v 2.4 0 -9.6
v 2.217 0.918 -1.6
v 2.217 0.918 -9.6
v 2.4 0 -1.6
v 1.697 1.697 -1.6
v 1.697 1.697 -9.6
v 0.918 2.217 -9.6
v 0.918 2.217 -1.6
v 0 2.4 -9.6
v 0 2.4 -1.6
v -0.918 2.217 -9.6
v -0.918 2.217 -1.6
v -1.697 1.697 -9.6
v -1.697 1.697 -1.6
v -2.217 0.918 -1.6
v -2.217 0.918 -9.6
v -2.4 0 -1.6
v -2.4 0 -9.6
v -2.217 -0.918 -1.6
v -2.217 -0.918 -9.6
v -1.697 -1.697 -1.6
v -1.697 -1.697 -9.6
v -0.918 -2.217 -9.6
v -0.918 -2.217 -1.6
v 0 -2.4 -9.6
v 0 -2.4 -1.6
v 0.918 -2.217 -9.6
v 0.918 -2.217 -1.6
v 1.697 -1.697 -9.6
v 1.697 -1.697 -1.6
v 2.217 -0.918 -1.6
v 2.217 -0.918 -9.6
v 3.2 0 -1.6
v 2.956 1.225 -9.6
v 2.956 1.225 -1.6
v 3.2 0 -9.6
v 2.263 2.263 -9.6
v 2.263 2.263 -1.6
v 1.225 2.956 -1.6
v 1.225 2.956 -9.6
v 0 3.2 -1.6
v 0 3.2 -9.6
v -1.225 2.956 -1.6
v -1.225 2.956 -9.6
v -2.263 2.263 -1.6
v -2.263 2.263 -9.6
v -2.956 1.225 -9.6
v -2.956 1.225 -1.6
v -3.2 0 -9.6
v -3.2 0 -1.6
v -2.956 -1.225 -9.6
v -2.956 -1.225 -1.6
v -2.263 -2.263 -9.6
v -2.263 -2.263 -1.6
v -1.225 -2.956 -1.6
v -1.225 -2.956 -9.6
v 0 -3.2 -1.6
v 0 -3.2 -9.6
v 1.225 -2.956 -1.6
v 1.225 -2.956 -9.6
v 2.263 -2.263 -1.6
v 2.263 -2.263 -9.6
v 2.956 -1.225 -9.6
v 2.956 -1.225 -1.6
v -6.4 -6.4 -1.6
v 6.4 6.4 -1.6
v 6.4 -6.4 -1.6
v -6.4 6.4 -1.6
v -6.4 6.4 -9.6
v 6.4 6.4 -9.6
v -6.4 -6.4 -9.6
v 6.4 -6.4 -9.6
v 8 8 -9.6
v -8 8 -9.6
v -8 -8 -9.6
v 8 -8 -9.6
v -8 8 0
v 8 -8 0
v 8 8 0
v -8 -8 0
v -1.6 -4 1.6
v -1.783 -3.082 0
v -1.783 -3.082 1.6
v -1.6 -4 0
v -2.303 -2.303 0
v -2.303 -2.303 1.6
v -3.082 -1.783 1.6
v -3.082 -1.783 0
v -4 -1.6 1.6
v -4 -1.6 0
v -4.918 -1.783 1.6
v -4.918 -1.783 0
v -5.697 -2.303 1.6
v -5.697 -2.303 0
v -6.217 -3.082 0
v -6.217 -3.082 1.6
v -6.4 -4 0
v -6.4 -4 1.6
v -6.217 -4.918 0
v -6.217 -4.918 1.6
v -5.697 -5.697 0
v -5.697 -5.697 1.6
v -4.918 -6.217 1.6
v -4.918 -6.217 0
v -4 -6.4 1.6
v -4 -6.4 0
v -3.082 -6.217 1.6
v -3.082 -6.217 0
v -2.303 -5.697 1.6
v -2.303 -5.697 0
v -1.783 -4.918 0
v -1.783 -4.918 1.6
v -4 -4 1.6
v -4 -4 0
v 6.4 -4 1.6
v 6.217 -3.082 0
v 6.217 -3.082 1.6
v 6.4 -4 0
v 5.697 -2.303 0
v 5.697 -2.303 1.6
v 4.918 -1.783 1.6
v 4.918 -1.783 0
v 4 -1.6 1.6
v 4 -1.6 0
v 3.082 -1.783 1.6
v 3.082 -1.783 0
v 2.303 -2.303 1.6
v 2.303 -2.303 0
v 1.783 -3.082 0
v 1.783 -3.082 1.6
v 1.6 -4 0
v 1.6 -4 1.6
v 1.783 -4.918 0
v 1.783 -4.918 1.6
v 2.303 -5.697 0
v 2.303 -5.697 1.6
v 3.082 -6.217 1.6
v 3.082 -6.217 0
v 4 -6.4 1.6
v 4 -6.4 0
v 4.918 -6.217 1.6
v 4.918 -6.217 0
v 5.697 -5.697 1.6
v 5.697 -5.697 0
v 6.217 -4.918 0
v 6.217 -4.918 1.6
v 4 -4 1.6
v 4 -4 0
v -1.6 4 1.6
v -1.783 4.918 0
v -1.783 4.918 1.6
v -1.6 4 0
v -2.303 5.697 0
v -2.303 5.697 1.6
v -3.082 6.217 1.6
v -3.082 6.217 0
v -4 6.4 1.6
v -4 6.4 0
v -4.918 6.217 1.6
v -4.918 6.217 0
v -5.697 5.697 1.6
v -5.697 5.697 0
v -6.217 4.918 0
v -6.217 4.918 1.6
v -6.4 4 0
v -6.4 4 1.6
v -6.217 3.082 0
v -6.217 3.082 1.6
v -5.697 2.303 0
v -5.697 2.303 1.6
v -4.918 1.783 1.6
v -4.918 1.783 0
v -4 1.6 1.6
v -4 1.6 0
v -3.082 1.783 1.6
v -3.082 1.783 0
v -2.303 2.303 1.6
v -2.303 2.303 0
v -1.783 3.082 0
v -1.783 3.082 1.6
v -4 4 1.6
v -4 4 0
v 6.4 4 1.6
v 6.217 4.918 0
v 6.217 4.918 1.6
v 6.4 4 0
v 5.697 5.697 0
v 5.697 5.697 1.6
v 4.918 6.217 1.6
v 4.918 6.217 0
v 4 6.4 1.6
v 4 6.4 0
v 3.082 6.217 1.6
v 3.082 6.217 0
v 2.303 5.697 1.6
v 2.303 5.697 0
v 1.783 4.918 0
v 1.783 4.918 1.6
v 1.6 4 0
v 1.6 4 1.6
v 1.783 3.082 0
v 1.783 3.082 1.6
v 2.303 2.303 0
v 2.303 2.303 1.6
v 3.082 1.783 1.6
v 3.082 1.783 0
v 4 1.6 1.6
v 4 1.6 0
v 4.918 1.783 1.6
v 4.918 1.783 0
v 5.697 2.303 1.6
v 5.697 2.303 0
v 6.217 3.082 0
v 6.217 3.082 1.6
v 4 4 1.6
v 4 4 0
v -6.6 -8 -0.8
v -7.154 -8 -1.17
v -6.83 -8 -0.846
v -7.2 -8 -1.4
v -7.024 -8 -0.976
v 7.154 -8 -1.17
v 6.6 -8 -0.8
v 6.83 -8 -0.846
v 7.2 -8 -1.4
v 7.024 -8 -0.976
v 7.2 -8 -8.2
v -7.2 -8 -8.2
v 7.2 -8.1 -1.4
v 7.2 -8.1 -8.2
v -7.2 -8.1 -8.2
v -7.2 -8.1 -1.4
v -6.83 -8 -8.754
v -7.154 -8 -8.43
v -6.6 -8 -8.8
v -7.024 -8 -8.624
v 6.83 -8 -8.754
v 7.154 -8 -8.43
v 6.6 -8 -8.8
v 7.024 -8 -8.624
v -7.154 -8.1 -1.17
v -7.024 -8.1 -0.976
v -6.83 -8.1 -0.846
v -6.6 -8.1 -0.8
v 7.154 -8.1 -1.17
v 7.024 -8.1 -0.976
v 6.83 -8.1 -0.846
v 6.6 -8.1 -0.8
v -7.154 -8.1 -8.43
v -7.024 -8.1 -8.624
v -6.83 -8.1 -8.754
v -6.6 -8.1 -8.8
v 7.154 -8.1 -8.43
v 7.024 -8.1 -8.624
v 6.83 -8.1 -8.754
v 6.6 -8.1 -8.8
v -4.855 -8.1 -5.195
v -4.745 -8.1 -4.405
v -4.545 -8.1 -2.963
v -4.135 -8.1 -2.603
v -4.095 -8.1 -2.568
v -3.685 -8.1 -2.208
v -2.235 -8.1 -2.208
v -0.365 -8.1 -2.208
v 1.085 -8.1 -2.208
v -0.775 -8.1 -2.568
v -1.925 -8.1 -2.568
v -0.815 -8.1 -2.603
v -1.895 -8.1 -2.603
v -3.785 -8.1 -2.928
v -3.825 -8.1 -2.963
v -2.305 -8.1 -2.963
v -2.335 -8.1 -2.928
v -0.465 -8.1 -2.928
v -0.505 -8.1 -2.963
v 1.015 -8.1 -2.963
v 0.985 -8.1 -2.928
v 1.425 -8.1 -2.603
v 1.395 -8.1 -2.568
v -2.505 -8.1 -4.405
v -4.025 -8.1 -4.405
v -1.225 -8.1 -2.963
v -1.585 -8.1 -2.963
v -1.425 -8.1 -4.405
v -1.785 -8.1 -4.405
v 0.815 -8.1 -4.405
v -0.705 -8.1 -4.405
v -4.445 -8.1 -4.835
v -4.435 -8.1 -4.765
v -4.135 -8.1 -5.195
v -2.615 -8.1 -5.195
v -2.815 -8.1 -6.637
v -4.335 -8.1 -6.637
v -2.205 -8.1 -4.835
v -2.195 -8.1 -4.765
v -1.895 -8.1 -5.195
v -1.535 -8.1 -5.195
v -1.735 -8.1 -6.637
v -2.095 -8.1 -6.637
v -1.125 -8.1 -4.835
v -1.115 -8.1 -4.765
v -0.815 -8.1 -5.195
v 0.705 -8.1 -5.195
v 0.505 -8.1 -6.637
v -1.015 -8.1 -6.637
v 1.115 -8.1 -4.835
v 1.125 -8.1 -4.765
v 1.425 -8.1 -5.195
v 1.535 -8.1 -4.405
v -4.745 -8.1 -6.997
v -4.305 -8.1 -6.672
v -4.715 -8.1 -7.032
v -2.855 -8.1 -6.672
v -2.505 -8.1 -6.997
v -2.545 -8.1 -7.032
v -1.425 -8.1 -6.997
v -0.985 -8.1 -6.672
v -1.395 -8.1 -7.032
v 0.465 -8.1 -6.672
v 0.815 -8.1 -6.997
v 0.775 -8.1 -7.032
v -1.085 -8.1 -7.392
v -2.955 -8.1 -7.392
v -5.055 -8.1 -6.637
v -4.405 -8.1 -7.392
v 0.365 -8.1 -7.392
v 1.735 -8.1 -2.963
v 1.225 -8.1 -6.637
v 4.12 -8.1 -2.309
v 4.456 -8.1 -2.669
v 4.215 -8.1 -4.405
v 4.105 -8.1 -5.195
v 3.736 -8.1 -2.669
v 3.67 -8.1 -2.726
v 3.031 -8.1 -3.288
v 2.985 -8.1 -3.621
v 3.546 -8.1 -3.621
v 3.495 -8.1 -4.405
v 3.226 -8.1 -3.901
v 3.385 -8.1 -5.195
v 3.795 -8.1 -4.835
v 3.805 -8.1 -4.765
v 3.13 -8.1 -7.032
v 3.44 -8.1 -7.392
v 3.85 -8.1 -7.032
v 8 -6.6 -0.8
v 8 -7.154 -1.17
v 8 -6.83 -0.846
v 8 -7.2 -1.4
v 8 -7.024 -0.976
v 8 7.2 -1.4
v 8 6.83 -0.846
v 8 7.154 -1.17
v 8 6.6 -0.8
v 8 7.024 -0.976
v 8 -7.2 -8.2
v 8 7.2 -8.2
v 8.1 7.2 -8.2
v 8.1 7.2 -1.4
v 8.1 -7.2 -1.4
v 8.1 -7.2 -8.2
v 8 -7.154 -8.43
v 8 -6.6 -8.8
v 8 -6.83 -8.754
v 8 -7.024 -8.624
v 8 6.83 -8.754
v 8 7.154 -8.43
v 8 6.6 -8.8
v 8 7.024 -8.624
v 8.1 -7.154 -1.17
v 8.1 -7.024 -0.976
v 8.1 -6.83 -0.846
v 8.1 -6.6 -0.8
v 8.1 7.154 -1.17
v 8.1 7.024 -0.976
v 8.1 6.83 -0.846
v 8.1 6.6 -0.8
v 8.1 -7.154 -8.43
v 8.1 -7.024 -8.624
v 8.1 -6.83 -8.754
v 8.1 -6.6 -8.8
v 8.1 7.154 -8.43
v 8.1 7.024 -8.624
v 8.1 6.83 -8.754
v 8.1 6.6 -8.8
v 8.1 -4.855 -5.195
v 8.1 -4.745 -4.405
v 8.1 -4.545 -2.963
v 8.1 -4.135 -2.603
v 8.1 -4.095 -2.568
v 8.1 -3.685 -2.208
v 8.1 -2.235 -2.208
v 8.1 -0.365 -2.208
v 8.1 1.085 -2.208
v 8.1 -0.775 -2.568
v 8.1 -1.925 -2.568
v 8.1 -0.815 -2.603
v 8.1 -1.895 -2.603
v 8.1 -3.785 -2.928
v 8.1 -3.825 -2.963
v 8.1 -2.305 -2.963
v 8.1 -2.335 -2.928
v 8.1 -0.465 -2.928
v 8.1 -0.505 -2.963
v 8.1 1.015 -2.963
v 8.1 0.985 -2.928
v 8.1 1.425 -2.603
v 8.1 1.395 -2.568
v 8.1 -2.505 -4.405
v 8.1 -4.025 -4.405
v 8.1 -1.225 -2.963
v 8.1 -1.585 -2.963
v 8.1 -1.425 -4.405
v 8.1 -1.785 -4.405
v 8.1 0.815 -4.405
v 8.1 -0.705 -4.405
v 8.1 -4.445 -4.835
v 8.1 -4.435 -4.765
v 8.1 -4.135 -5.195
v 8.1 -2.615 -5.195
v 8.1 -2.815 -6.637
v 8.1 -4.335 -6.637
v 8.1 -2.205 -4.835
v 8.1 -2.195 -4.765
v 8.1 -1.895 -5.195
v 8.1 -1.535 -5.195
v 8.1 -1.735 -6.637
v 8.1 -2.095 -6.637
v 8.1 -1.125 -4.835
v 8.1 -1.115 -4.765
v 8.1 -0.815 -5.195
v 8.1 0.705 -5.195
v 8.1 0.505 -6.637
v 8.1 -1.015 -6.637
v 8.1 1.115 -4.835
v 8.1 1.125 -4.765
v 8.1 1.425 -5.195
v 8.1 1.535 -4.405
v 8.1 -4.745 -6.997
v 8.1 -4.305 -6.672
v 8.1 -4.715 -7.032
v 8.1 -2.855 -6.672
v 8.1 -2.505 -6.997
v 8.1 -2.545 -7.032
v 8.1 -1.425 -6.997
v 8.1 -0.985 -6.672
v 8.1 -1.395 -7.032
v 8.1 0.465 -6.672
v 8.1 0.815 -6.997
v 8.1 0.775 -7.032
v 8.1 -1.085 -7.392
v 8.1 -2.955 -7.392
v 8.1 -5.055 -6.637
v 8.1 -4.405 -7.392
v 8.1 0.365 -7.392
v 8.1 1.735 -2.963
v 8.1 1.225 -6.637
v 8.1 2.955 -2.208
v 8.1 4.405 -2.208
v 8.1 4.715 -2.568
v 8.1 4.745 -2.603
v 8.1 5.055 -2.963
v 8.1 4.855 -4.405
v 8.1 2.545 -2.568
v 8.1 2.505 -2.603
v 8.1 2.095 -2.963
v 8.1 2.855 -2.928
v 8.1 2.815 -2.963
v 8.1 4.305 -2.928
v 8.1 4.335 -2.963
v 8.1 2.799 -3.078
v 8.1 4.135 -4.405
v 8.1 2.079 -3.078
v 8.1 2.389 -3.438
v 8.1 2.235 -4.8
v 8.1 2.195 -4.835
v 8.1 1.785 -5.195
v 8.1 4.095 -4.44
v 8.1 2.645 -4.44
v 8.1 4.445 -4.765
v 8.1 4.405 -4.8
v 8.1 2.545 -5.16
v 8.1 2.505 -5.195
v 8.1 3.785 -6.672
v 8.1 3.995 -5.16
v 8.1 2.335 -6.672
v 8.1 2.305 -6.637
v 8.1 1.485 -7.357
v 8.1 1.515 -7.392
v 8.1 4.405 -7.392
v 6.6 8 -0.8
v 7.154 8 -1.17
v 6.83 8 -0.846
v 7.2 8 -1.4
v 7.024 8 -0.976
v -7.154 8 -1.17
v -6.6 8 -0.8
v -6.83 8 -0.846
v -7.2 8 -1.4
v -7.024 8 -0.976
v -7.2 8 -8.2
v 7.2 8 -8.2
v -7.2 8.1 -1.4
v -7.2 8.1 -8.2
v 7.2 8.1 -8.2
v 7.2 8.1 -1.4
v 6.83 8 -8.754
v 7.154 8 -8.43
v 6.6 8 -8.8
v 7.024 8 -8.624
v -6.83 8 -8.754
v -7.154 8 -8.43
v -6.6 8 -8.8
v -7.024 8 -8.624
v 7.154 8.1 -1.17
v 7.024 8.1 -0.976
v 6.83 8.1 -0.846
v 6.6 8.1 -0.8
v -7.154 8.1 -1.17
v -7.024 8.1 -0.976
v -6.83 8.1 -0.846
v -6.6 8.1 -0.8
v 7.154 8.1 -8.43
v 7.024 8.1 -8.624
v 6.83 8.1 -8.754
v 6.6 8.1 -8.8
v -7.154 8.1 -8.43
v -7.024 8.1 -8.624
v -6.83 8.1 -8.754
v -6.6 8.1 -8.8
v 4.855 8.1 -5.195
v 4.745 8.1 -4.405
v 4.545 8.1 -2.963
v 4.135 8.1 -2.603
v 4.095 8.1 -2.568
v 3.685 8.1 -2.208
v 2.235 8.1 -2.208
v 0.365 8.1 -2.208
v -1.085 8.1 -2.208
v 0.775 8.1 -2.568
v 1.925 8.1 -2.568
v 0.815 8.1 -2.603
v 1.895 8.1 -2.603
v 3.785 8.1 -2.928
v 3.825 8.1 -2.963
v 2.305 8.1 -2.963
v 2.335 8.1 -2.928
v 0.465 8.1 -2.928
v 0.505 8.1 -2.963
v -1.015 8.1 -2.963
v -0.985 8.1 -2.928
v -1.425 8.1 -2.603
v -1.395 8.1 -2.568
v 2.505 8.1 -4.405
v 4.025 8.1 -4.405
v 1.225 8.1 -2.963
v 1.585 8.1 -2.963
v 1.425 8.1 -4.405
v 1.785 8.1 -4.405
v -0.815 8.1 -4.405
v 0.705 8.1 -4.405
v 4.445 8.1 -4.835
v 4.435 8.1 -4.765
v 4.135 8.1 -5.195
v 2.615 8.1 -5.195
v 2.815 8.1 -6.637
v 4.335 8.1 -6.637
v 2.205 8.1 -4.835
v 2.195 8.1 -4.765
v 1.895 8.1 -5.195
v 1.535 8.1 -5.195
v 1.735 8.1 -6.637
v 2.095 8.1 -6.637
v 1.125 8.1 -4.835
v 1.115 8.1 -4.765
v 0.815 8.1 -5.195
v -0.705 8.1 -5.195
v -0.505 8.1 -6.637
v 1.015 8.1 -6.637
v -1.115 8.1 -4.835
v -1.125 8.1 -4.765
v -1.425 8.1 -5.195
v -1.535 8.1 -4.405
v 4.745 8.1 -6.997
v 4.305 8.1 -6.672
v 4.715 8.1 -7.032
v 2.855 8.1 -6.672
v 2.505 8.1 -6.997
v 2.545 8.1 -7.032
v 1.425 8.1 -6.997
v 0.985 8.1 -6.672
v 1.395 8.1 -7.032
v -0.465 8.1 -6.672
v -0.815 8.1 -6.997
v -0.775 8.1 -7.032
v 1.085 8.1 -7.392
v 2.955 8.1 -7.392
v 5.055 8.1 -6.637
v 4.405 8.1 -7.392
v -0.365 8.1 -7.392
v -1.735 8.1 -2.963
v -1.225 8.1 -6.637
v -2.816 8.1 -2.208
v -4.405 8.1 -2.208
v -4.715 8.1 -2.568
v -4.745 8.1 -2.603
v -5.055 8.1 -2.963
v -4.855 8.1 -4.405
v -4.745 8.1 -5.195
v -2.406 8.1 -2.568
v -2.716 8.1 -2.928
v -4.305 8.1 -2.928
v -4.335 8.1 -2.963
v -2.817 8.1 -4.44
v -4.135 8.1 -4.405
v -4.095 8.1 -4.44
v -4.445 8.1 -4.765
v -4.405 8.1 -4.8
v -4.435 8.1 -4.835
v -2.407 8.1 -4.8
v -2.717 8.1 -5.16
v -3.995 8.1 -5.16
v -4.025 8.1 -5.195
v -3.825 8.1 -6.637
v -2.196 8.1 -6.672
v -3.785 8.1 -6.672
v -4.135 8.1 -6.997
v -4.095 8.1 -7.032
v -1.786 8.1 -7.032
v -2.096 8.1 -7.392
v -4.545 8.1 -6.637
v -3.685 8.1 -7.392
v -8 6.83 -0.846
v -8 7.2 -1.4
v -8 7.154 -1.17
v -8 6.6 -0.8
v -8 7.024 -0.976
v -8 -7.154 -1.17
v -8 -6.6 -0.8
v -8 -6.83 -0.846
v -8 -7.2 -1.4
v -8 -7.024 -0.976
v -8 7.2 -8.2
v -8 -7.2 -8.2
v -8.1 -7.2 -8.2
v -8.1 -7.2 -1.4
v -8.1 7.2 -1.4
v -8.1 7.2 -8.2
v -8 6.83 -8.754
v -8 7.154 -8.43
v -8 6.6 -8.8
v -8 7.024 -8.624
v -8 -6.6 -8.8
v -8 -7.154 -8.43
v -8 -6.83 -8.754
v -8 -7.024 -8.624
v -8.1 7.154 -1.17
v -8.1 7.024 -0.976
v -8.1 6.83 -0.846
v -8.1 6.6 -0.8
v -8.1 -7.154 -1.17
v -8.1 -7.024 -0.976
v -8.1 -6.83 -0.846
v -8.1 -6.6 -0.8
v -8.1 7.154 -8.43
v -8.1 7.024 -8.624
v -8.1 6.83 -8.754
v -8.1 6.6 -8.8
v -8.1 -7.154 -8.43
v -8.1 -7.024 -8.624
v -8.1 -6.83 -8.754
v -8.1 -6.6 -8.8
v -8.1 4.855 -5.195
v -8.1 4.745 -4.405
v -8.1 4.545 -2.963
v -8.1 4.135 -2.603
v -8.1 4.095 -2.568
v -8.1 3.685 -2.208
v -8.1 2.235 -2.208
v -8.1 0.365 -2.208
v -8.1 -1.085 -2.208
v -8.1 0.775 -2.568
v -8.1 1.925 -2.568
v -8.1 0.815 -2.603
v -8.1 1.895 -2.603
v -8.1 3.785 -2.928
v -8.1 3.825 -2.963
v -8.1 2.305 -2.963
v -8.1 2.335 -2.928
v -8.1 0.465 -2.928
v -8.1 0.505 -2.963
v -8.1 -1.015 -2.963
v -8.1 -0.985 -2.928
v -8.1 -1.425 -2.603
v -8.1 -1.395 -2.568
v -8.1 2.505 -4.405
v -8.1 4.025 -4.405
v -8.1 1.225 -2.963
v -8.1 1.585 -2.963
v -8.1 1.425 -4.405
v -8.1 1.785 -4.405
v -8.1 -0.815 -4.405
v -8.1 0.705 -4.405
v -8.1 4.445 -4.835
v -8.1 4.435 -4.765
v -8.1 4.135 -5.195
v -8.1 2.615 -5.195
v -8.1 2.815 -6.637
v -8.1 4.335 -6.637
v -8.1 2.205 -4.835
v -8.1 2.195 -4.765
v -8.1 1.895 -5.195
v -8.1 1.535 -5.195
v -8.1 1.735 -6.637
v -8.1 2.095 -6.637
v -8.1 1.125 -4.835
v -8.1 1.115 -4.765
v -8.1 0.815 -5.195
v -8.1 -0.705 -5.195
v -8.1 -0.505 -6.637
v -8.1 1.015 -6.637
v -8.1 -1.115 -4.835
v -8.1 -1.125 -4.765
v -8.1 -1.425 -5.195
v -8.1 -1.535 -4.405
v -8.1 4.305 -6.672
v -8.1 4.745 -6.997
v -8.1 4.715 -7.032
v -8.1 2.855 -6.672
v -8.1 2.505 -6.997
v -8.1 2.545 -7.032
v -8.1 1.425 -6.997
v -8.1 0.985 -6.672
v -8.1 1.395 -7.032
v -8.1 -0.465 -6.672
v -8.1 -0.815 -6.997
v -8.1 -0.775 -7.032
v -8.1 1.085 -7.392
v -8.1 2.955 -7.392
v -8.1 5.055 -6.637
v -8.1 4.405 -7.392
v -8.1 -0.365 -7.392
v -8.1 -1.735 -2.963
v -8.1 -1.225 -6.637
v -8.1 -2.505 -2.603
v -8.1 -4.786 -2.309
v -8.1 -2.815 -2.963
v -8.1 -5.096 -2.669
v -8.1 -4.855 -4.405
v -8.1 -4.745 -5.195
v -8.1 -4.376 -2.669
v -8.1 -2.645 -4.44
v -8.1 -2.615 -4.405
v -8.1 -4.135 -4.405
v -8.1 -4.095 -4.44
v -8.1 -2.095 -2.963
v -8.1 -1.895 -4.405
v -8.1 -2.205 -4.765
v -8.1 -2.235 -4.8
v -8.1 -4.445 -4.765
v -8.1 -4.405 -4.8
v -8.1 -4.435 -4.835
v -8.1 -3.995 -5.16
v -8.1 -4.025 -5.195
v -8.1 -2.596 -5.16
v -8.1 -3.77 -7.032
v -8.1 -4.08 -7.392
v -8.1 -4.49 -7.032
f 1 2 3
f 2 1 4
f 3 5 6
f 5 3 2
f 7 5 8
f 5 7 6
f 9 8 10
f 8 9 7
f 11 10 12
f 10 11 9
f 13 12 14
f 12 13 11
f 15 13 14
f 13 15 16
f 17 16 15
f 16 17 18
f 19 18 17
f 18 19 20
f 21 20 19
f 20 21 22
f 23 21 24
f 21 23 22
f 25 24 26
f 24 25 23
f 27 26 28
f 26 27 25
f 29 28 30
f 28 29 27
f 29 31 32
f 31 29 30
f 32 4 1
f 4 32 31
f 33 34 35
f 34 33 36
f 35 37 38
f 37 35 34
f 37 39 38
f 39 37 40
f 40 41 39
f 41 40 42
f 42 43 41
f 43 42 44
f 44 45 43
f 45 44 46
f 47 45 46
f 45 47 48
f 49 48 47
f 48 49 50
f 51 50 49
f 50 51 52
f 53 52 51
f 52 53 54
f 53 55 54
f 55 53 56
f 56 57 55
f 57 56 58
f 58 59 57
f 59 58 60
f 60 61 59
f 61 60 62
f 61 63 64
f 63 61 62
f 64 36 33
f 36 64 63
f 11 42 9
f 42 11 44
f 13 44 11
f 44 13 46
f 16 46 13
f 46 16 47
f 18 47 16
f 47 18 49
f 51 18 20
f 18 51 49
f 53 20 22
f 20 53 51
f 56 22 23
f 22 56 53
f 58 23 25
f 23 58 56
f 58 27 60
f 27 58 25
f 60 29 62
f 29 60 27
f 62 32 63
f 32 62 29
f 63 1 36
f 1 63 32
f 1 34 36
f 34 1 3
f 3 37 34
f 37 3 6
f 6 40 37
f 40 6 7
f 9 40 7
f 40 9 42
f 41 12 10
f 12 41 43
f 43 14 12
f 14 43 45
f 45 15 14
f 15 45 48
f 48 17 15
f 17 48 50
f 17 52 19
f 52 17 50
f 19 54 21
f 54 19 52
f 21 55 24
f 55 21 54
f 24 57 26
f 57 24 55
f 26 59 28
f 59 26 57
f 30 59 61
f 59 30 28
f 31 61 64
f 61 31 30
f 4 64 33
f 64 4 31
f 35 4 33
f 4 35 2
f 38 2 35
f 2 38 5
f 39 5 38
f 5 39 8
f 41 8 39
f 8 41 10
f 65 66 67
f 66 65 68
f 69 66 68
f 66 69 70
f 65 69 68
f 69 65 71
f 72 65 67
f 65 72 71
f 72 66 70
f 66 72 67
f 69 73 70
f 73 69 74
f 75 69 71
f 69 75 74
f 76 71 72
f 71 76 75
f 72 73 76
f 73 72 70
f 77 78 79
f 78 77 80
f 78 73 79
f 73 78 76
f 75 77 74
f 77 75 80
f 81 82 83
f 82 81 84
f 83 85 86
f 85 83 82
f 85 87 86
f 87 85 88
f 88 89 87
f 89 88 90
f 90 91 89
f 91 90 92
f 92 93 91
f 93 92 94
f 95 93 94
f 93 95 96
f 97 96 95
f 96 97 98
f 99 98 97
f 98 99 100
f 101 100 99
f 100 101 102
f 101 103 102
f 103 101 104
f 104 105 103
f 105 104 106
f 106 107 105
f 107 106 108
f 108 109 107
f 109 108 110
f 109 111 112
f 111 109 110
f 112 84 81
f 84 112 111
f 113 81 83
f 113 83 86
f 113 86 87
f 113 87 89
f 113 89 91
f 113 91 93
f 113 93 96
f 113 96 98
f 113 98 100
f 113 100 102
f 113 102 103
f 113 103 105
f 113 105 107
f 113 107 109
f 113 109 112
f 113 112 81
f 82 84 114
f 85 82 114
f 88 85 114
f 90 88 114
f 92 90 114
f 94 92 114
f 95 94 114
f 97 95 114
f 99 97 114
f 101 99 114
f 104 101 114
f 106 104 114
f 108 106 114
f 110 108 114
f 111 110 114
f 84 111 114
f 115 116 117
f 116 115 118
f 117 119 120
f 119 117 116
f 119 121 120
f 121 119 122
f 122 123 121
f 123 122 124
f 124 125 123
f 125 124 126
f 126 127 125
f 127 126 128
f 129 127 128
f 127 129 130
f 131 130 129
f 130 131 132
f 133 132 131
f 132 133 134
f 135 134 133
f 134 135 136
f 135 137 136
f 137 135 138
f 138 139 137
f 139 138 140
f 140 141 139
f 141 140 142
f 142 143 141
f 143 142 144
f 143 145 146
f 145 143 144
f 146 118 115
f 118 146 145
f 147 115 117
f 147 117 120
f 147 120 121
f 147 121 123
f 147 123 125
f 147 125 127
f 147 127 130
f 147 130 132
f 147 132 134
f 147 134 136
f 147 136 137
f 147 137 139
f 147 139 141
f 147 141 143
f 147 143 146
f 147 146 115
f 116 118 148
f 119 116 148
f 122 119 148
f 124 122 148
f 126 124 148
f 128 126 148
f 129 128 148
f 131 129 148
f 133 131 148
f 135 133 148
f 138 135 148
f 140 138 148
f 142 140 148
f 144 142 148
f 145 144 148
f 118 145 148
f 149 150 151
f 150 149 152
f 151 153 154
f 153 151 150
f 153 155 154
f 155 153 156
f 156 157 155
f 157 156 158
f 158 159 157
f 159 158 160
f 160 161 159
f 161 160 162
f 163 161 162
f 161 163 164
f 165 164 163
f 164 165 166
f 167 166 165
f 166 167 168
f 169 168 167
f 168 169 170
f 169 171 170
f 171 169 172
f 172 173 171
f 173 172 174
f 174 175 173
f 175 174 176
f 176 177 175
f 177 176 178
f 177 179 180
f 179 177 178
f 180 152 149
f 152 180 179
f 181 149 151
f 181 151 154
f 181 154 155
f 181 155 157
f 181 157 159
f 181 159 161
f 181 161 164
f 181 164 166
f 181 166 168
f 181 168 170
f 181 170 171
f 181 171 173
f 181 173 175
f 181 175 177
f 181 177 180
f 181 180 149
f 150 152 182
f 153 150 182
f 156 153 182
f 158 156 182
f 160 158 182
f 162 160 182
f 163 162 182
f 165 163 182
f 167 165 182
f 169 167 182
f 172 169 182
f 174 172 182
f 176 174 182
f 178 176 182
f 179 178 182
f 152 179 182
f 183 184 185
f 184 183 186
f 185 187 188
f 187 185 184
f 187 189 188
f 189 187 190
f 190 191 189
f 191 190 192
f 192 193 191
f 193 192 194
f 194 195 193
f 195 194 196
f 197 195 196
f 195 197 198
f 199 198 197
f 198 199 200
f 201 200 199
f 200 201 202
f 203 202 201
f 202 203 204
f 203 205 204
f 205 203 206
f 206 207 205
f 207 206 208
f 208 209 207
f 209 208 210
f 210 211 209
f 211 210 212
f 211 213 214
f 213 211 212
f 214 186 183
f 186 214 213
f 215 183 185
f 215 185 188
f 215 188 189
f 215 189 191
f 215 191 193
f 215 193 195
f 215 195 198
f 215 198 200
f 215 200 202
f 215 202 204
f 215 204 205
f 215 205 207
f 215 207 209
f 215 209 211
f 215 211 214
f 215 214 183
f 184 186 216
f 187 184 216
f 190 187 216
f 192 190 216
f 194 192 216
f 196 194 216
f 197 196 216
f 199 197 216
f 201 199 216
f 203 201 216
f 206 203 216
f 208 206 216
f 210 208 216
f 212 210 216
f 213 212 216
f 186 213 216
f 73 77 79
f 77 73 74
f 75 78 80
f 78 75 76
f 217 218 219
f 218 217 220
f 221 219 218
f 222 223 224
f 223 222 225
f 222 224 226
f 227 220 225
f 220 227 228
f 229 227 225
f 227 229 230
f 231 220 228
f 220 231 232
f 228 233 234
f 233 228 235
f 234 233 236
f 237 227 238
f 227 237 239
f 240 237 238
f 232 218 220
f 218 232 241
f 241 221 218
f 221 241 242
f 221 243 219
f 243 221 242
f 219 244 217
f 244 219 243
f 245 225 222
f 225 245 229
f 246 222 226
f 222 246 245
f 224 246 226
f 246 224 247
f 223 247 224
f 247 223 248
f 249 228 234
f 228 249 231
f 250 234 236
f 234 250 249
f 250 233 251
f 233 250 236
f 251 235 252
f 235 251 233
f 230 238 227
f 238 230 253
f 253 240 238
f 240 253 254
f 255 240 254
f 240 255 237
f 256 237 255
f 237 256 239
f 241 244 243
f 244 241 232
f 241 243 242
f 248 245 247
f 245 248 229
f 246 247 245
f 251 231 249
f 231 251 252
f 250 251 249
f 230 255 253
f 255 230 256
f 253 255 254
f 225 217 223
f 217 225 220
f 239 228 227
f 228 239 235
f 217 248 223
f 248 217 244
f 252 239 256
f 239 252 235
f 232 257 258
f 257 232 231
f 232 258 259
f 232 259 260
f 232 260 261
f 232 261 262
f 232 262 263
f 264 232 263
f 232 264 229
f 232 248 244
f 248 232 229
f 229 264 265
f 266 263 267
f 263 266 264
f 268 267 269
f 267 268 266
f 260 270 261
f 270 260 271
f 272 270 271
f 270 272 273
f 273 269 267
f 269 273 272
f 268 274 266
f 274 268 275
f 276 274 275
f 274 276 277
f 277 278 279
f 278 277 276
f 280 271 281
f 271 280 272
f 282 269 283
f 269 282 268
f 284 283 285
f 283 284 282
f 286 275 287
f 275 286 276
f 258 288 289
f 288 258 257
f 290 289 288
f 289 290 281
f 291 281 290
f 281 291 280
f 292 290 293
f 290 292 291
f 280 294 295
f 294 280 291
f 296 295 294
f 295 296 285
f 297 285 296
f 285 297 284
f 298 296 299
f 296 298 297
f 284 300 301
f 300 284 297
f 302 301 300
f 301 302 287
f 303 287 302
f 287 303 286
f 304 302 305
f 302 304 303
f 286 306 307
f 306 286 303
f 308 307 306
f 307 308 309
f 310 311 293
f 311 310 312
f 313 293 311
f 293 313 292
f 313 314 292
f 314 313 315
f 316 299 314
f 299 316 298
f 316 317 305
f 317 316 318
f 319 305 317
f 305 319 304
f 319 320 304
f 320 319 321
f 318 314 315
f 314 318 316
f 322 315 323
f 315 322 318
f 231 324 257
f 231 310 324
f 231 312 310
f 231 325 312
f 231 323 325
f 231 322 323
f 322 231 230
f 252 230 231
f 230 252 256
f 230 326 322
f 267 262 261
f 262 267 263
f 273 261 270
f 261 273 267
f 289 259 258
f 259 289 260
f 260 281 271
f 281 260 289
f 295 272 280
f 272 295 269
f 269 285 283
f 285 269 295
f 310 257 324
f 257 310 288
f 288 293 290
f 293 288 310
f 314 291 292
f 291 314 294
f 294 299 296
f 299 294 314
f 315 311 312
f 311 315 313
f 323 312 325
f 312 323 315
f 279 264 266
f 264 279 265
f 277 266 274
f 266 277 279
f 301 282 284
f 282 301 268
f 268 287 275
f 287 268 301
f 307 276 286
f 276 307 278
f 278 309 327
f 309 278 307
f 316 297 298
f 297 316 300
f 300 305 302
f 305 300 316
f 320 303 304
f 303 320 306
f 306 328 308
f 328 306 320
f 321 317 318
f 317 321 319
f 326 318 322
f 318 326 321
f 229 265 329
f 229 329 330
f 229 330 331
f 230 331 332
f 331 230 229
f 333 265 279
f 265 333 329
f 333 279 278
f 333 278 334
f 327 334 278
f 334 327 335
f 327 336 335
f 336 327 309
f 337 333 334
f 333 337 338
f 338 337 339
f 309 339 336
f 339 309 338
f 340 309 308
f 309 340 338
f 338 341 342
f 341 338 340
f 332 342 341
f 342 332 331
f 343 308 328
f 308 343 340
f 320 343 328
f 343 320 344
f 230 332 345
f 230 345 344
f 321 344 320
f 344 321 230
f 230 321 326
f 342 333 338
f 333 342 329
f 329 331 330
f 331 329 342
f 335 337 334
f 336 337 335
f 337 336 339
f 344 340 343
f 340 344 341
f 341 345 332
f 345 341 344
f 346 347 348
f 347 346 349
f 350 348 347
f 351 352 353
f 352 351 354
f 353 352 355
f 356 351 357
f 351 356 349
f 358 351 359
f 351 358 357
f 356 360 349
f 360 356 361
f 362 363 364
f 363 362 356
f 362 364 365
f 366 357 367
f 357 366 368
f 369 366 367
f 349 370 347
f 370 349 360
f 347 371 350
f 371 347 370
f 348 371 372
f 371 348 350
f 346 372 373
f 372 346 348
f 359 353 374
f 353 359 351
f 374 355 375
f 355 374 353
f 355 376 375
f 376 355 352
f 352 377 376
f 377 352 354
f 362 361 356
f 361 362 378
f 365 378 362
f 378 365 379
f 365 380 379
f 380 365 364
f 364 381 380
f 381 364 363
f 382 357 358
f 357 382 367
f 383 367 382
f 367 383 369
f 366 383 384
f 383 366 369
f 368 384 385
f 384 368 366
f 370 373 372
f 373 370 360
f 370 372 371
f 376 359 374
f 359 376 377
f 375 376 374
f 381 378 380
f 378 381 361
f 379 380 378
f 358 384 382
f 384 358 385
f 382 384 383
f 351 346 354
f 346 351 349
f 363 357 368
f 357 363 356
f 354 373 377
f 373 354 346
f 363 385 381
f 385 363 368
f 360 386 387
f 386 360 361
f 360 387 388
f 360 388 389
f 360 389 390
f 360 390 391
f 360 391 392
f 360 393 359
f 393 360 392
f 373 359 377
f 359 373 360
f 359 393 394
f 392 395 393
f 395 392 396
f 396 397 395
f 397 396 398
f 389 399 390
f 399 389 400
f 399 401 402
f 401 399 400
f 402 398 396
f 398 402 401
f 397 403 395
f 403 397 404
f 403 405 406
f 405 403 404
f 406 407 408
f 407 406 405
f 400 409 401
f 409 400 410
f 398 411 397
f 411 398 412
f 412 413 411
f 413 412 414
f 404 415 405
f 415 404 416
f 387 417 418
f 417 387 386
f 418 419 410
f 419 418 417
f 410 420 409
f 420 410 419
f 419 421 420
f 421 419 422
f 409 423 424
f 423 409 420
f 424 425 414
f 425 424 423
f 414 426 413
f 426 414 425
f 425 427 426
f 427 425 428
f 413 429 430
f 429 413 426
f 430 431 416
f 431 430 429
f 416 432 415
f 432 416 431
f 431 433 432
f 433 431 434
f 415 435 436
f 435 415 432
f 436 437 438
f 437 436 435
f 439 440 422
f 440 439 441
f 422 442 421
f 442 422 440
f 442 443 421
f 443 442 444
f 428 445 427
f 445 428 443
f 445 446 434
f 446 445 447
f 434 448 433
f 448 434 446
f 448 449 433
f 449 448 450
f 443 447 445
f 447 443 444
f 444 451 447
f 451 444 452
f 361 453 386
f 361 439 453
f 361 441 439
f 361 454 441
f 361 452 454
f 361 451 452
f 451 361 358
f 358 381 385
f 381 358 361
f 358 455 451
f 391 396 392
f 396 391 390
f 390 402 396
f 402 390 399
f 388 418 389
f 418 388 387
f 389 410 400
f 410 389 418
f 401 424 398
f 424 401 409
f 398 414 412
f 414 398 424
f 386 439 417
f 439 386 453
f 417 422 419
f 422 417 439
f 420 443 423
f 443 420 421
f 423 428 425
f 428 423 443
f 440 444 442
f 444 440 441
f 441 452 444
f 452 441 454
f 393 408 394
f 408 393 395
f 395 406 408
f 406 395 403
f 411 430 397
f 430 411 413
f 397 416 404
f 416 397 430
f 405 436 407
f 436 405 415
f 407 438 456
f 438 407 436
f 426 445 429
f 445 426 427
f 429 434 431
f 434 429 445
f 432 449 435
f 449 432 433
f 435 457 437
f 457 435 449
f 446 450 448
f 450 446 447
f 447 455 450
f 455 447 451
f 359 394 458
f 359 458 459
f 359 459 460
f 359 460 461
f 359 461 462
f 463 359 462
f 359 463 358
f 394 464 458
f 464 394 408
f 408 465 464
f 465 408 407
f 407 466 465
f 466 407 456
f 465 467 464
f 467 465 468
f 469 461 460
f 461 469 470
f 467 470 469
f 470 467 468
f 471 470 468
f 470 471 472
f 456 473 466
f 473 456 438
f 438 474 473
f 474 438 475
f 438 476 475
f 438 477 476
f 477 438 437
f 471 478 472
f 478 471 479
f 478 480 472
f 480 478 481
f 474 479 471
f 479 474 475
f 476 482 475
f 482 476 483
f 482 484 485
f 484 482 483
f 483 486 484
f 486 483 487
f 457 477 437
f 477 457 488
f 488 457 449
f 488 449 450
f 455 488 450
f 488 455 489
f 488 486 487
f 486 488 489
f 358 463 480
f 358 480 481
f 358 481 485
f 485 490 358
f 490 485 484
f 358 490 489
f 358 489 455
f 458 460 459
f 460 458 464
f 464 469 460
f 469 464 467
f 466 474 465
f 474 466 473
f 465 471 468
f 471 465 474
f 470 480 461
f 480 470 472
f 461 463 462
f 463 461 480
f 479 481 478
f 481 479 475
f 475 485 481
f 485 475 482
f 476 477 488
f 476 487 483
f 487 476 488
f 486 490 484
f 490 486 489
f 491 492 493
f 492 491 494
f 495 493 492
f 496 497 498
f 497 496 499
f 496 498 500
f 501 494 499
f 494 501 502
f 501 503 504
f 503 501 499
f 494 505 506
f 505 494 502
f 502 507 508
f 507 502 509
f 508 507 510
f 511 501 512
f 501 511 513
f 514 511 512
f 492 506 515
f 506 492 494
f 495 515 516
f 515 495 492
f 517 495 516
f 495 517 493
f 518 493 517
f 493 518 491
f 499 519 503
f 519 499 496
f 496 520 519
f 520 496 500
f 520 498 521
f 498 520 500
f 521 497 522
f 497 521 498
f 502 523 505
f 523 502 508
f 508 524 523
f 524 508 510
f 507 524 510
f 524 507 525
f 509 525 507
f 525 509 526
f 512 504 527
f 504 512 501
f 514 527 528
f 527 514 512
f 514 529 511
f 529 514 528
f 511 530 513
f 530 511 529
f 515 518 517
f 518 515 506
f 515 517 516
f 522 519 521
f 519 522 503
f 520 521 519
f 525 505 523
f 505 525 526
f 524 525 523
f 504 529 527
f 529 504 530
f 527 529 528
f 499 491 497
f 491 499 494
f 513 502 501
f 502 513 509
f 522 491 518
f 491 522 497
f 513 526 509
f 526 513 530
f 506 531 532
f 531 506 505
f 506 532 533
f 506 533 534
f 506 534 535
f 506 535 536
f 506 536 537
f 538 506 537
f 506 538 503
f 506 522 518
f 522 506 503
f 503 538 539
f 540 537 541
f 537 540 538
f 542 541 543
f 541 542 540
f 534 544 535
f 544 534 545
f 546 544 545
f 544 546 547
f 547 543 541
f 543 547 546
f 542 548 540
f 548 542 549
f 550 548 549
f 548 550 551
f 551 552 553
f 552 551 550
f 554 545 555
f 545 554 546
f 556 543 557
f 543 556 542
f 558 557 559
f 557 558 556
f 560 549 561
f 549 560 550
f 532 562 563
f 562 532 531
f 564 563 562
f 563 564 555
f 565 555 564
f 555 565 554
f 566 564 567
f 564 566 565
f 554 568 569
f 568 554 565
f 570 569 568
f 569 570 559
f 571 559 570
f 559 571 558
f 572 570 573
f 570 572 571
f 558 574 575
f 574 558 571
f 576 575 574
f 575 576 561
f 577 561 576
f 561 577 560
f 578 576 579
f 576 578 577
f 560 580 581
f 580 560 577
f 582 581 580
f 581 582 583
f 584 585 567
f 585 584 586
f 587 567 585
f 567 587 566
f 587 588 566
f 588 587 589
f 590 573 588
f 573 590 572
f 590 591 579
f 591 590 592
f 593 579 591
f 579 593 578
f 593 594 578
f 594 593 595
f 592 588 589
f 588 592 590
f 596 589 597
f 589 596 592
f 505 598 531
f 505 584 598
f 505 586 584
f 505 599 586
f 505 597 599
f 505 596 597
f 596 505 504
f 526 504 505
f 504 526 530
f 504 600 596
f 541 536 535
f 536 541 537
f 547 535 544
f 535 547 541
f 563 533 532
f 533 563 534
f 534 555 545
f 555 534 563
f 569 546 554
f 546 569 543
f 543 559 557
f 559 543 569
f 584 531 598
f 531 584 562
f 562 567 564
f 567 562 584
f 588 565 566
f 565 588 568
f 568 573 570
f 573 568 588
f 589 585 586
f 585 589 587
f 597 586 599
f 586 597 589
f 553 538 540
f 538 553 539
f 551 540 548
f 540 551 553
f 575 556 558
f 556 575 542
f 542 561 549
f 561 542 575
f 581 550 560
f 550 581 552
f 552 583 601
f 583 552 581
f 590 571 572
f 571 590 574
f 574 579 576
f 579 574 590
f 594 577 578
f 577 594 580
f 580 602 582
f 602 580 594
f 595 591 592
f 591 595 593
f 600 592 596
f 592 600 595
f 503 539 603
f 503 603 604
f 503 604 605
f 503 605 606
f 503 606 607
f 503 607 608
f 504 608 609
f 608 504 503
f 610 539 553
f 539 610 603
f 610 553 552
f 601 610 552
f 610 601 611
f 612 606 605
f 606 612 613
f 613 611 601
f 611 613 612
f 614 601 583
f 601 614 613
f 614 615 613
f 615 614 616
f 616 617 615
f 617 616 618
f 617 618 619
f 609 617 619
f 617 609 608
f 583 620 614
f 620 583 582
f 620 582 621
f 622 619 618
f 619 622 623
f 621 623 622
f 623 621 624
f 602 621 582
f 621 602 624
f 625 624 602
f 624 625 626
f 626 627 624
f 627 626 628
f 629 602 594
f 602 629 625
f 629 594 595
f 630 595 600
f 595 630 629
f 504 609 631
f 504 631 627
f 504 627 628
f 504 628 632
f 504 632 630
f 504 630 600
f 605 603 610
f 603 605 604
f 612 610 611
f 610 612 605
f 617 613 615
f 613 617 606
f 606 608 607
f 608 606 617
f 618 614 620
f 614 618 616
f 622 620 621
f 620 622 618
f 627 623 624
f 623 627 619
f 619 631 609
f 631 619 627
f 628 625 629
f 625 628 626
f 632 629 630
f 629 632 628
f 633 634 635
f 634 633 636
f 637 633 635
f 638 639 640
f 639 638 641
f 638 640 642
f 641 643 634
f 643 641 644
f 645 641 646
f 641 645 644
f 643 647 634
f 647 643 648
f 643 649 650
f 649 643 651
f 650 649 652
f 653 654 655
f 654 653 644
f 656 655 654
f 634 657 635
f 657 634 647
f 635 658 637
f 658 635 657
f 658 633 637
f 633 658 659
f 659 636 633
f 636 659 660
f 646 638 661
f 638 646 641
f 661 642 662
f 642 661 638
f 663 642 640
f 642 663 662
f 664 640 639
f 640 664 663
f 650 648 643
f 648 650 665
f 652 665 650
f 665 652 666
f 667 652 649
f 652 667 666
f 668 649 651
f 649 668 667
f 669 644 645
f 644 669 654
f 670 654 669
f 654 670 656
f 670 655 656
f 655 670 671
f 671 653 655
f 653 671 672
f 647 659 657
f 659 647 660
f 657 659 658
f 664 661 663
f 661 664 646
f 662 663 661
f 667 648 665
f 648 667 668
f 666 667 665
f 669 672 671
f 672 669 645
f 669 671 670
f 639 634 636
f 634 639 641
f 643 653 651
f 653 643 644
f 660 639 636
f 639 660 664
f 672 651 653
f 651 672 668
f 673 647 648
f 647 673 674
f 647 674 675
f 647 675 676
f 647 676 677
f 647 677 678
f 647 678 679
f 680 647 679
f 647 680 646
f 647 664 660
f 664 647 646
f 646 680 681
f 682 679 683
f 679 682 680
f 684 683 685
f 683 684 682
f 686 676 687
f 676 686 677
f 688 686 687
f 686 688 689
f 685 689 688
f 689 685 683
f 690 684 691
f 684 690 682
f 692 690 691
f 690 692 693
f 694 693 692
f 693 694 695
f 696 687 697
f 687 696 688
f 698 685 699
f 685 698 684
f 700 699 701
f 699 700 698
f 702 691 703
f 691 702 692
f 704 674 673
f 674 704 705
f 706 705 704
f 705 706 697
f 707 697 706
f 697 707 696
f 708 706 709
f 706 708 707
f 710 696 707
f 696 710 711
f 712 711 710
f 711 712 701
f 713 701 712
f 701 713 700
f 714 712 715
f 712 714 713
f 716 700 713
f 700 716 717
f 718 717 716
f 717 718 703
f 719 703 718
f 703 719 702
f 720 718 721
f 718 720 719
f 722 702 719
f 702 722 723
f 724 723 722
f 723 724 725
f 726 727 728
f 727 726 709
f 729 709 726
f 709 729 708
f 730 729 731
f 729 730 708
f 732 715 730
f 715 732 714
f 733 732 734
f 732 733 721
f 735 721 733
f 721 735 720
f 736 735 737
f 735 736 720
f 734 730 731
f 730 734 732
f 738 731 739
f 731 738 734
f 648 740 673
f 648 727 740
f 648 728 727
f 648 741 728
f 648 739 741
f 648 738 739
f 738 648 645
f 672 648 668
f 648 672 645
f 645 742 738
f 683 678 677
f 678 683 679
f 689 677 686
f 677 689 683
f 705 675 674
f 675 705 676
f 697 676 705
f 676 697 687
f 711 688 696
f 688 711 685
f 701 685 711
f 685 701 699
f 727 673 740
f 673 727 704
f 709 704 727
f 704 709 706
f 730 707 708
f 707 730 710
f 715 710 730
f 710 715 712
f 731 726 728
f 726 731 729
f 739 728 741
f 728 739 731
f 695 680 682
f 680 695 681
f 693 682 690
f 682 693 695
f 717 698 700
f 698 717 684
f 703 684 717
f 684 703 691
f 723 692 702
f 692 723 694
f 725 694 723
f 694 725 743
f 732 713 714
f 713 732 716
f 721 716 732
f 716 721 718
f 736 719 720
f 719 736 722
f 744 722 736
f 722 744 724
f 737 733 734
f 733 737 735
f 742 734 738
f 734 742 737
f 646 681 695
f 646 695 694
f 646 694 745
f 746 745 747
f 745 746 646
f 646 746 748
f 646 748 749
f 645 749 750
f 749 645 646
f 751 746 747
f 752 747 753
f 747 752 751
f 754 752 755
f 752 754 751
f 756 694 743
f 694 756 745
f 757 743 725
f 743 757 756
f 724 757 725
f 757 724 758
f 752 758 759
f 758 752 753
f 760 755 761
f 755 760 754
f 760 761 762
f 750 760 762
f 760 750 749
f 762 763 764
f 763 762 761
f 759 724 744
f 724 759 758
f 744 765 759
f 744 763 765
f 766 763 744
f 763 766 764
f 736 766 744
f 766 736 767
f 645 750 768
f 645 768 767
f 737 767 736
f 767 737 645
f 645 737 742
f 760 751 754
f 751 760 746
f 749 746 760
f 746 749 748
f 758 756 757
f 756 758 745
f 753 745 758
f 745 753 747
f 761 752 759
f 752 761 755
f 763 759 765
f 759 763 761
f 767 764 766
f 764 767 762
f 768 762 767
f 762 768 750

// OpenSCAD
use <../lib.scad>
use <3003.scad>
use <6221655ak.scad>
use <6221655al.scad>
use <6221655am.scad>
use <6221655an.scad>
function ldraw_lib__3003d08() = [
// 0 Brick  2 x  2 with Yellow Digital "1" "2" "3" "4" on Black Background Stickers
// 0 Name: 3003d08.dat
// 0 Author: Alfred Schmitz [AlfredS]
// 0 !LDRAW_ORG Shortcut UPDATE 2026-09
// 0 !LICENSE Licensed under CC BY 4.0 : see CAreadme.txt
// 
// 0 BFC CERTIFY CCW
  [0,"BFC","CERTIFY"],
  [0,"BFC","CCW"],
// 
// 0 !CATEGORY Sticker Shortcut
// 0 !KEYWORDS 911 RSR, Porsche, Set 75888, Speed Champions, Turbo
// 
// 0 !HISTORY 2026-09-30 [OrionP] Official Update 2026-09
// 
// 1 16 0 0 0 1 0 0 0 1 0 0 0 1 3003.dat
  [1,16,0,0,0,1,0,0,0,1,0,0,0,1, ldraw_lib__3003()],
// 1 16 0 12 -20 1 0 0 0 0 -1 0 1 0 6221655ak.dat
  [1,16,0,12,-20,1,0,0,0,0,-1,0,1,0, ldraw_lib__6221655ak()],
// 1 16 20 12 0 0 -1 0 0 0 -1 1 0 0 6221655al.dat
  [1,16,20,12,0,0,-1,0,0,0,-1,1,0,0, ldraw_lib__6221655al()],
// 1 16 0 12 20 -1 0 0 0 0 -1 0 -1 0 6221655am.dat
  [1,16,0,12,20,-1,0,0,0,0,-1,0,-1,0, ldraw_lib__6221655am()],
// 1 16 -20 12 0 0 1 0 0 0 -1 -1 0 0 6221655an.dat
  [1,16,-20,12,0,0,1,0,0,0,-1,-1,0,0, ldraw_lib__6221655an()],
];
module ldraw_lib__3003d08(step=0, col=false, unit=2/5, alt=false, line=0.2, solid=!$preview)
    makepoly(ldraw_lib__3003d08(), step=step, col=col, unit=unit, alt=alt, line=line, solid=solid);
ldraw_lib__3003d08(line=0.2);
